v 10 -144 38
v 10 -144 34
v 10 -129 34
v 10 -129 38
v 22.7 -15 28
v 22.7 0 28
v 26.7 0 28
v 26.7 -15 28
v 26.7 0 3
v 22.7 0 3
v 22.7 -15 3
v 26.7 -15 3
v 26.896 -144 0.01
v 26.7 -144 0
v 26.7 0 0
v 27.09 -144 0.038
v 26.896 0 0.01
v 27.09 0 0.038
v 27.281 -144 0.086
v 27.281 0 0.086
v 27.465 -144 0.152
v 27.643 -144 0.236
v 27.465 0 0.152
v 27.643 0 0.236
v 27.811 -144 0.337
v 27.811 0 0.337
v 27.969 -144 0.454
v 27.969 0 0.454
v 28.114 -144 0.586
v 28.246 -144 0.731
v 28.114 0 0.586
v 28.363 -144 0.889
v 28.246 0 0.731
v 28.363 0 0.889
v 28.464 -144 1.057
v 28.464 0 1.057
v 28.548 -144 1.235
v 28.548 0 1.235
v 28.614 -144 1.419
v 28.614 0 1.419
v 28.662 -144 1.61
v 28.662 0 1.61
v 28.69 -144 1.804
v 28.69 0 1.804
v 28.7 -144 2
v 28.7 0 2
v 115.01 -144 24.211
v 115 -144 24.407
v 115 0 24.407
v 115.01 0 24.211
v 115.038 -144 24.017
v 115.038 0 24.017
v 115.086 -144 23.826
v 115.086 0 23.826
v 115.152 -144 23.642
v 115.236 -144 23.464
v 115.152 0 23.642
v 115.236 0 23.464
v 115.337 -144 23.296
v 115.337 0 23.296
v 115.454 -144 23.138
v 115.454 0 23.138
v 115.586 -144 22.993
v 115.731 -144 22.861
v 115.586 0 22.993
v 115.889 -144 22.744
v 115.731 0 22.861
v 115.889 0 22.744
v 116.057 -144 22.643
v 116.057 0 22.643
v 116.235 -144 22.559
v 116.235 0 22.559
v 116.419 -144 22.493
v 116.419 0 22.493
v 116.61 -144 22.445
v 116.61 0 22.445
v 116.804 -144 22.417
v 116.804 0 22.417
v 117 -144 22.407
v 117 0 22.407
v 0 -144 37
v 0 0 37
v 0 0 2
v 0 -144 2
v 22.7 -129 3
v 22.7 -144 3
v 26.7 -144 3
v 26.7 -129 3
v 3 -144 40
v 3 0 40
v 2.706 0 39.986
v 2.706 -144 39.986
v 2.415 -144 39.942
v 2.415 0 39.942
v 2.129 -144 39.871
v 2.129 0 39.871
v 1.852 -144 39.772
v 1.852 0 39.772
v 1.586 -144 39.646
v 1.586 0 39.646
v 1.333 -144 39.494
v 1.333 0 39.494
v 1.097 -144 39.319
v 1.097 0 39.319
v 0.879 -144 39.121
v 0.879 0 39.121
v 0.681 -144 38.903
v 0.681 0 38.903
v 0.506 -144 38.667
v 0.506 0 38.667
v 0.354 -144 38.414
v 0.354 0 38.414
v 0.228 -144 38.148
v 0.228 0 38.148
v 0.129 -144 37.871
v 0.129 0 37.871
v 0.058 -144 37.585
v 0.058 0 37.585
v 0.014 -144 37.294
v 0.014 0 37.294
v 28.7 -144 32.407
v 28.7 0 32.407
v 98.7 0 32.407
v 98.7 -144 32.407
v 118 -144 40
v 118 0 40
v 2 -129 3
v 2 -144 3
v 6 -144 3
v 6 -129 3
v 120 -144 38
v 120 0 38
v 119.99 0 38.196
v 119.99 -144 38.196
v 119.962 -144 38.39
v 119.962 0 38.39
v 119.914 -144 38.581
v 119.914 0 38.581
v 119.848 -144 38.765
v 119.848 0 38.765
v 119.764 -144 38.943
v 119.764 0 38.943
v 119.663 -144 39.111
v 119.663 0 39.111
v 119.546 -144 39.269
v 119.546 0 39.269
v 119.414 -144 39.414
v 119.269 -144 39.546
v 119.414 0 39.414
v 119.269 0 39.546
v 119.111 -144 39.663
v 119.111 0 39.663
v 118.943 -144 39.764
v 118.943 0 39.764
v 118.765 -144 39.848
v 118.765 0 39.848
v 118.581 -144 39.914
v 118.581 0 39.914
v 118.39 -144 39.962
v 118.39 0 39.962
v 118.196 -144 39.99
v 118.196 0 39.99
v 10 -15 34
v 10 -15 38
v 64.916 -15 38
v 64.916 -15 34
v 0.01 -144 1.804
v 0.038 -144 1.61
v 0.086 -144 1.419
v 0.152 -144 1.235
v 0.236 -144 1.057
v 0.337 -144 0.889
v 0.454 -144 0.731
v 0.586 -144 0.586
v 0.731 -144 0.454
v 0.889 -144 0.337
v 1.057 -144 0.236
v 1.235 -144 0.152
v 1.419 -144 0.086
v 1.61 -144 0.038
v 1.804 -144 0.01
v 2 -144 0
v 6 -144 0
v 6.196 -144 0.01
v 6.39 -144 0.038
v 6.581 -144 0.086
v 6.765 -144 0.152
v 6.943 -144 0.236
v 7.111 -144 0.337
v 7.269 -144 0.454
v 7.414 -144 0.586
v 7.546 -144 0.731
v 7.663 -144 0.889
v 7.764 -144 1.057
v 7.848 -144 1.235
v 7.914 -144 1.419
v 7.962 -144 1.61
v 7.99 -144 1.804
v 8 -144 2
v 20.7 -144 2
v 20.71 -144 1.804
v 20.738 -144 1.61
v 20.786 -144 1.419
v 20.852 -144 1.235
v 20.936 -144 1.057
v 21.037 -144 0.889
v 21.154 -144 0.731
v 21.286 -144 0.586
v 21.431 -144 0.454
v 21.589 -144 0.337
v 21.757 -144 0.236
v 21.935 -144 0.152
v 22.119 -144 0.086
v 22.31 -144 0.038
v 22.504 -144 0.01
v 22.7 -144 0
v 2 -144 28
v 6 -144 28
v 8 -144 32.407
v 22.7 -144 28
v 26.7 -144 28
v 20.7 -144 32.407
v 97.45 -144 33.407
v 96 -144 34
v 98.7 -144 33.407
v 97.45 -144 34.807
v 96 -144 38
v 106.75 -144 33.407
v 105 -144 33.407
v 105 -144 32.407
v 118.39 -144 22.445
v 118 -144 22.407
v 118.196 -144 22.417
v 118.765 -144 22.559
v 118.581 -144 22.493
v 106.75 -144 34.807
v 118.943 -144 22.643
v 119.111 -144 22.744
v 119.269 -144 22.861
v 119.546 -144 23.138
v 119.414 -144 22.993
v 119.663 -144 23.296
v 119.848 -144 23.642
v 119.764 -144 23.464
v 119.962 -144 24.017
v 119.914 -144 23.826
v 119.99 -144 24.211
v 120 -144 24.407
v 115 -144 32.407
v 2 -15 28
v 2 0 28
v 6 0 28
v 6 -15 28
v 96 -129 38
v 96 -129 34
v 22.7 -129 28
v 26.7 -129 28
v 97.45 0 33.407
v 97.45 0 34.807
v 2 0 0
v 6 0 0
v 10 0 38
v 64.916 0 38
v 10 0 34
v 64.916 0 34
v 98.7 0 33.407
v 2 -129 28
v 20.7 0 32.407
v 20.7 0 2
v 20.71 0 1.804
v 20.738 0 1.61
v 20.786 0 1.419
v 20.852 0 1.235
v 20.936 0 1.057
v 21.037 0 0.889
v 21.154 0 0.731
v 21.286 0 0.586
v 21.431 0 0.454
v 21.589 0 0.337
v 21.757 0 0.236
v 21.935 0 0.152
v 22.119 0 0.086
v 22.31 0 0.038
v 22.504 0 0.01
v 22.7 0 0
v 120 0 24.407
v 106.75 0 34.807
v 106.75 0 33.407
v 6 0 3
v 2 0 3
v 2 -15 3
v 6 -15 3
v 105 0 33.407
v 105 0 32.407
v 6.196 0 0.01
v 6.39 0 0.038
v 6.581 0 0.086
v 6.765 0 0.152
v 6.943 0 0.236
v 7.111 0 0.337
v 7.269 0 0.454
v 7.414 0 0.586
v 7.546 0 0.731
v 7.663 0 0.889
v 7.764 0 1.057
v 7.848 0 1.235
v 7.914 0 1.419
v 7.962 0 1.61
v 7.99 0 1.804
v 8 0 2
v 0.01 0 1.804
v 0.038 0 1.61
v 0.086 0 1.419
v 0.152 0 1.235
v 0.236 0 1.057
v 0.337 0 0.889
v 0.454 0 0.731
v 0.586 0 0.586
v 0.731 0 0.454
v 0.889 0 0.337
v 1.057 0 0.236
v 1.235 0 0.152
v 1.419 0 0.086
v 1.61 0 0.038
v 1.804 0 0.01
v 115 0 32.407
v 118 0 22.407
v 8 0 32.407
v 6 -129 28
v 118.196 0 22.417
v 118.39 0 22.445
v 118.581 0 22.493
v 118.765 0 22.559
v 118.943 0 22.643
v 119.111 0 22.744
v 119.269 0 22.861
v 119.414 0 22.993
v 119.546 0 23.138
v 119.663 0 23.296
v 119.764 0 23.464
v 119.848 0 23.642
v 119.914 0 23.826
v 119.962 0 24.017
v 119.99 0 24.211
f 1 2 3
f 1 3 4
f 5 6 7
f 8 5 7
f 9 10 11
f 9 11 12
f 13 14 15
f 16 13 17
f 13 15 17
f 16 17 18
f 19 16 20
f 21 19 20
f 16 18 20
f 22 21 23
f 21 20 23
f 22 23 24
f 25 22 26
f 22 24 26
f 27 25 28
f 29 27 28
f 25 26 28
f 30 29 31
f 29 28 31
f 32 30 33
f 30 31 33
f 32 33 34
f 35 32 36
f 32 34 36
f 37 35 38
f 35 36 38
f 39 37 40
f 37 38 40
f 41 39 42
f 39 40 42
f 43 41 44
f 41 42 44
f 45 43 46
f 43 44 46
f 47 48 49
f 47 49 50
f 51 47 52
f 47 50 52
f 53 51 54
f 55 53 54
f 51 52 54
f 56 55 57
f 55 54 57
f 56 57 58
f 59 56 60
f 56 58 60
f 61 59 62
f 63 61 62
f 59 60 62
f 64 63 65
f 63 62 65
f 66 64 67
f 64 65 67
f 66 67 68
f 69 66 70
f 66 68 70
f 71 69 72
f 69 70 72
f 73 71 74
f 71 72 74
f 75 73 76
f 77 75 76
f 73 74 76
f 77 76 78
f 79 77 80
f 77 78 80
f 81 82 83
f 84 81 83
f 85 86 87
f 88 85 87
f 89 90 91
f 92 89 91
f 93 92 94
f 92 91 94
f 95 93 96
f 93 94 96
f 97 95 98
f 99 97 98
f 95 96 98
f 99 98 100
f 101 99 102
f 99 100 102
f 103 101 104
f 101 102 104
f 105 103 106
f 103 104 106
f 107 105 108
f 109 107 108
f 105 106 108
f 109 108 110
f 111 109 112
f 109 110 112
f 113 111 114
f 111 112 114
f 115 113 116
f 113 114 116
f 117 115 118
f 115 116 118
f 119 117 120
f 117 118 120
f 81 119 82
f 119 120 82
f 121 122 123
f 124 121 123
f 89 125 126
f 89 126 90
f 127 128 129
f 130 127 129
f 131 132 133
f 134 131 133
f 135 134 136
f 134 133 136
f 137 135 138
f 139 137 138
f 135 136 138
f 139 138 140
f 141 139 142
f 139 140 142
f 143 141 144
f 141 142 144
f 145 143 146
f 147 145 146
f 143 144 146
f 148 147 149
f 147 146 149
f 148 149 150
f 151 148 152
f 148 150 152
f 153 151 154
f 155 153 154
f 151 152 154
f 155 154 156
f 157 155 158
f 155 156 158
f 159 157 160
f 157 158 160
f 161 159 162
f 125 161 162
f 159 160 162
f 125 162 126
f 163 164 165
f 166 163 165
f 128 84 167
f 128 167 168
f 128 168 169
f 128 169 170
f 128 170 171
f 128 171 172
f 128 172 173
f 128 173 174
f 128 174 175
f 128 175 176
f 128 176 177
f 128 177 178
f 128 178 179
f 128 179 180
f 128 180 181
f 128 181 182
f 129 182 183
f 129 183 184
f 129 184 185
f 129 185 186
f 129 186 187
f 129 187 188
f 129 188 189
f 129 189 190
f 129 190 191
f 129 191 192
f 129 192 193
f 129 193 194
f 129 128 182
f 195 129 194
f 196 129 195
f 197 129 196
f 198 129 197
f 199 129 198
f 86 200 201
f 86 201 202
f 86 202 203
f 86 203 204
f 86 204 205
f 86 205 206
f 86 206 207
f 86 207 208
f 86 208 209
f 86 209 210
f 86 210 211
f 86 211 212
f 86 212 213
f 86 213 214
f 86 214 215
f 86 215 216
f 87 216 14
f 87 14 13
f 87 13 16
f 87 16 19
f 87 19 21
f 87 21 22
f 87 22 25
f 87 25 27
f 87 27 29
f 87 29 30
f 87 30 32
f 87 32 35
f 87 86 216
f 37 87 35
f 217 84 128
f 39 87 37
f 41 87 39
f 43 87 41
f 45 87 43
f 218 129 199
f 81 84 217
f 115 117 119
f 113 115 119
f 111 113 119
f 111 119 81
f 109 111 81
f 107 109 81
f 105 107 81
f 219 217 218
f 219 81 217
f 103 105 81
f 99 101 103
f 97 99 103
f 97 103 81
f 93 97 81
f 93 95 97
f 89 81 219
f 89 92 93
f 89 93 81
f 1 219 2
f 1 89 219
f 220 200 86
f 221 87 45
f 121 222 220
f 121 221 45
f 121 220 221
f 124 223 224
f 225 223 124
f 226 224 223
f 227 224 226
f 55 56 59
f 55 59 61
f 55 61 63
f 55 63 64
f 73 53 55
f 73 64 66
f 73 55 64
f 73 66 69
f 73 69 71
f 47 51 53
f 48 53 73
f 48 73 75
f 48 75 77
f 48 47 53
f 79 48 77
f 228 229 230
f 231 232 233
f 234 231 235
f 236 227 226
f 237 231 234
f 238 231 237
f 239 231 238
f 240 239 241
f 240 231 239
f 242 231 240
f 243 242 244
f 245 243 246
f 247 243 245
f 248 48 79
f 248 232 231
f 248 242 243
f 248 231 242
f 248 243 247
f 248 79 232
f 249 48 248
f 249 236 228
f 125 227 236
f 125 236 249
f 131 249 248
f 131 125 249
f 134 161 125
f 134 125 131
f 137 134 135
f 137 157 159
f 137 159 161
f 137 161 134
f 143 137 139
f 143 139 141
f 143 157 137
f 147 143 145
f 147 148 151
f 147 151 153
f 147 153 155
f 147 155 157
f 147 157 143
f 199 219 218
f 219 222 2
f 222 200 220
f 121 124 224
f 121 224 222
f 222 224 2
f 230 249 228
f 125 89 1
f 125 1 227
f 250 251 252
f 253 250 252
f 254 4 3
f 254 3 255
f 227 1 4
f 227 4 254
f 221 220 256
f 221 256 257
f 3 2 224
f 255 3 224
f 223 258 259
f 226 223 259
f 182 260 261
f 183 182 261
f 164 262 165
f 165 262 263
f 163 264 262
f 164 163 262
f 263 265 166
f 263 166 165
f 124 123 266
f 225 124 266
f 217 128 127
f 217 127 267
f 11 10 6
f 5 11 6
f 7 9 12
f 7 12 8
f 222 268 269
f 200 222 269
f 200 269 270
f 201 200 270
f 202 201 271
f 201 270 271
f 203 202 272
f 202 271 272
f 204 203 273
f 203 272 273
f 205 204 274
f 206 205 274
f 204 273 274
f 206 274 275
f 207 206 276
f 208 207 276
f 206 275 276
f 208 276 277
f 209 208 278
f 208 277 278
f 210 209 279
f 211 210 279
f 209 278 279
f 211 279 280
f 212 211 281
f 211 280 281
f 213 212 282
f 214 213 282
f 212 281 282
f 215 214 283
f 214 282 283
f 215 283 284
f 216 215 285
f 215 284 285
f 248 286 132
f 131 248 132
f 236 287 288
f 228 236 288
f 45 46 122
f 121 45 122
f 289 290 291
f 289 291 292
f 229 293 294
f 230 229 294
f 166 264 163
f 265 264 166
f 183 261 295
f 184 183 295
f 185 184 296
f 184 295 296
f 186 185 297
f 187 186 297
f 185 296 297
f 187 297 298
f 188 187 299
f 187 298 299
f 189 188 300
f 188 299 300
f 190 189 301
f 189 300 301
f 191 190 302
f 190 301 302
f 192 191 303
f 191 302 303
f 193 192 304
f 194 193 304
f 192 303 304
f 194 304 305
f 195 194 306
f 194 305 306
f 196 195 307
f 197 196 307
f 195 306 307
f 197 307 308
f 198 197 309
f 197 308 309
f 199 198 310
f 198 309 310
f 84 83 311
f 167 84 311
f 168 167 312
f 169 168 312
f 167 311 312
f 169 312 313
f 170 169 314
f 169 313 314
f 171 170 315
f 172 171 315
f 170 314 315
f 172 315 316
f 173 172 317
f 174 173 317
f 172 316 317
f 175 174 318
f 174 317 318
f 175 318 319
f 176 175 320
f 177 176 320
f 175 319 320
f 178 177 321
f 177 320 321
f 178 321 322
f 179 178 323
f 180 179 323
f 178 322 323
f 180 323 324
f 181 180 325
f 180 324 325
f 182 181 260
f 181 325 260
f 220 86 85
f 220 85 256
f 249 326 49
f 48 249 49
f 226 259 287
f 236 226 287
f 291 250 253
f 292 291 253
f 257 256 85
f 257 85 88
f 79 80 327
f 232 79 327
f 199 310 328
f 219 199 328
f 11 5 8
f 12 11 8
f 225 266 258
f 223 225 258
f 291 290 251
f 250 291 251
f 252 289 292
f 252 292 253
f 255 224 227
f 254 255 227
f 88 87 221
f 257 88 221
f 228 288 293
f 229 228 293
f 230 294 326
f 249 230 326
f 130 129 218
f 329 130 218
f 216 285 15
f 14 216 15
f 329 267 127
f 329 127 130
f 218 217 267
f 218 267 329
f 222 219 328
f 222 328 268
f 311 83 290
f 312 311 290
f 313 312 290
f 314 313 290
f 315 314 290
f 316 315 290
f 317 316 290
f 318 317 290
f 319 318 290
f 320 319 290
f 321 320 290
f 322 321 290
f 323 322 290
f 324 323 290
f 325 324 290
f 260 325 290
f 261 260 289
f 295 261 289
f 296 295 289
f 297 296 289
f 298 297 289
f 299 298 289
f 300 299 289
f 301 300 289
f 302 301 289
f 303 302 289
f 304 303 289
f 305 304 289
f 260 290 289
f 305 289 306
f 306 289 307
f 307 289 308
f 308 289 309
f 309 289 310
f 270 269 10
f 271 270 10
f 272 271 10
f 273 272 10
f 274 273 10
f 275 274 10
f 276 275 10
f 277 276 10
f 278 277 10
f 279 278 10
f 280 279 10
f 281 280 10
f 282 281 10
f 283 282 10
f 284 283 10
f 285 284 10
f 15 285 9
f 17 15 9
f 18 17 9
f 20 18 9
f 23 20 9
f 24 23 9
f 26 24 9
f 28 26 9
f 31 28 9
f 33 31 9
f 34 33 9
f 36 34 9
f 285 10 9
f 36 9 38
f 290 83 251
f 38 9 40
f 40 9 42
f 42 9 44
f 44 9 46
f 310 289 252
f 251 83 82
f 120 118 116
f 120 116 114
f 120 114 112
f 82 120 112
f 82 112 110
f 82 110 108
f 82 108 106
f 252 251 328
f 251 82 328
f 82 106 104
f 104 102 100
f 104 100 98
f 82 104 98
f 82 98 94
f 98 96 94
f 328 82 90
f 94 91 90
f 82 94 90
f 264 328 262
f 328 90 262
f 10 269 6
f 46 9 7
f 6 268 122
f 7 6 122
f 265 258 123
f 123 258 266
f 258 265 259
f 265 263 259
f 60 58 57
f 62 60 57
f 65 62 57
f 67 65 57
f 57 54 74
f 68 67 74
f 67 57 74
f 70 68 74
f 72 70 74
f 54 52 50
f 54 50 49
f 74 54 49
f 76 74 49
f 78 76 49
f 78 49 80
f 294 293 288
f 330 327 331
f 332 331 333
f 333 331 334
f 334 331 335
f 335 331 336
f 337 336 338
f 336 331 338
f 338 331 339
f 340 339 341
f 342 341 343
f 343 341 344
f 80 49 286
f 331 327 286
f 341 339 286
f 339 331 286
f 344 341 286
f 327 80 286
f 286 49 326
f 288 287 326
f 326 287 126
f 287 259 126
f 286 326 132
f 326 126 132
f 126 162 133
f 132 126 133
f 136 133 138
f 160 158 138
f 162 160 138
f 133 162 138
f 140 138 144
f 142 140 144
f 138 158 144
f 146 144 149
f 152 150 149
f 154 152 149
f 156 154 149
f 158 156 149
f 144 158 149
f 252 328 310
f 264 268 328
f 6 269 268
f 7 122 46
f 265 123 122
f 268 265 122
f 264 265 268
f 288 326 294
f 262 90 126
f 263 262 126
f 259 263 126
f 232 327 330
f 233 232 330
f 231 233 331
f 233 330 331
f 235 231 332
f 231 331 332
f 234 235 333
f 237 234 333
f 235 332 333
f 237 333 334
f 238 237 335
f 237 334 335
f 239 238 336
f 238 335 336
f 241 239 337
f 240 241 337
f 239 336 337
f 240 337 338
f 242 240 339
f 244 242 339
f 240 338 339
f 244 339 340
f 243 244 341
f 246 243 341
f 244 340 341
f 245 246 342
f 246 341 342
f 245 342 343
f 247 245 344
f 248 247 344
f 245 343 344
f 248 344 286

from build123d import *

# Parameters (mm, degrees)
F1_DEPTH = 144
F2_W     = 86
F2_H     = 4
F2_W_2   = 4
F2_H_2   = 25
F3_DEPTH = 15
F4_W     = 54.916096
F4_H     = 4
F4_W_2   = 4
F4_H_2   = 25
F5_DEPTH = 15


with BuildPart() as f1:
    # F0 (on Front) → F1 (new body)
    with BuildSketch(Plane.XZ):
        with BuildLine():
            Line((0, 37), (0, 2))
            ThreePointArc((0, 2), (0.585786, 0.585786), (2, 0))
            Line((2, 0), (6, 0))
            ThreePointArc((6, 0), (7.414214, 0.585786), (8, 2))
            Line((8, 2), (8, 32.406905))
            Line((8, 32.406905), (20.7, 32.406905))
            Line((20.7, 32.406905), (20.7, 2))
            ThreePointArc((20.7, 2), (21.285786, 0.585786), (22.7, 0))
            Line((22.7, 0), (26.7, 0))
            ThreePointArc((26.7, 0), (28.114214, 0.585786), (28.7, 2))
            Line((28.7, 2), (28.7, 32.406905))
            Line((28.7, 32.406905), (98.7, 32.406905))
            Line((98.7, 32.406905), (98.7, 33.406905))
            Line((98.7, 33.406905), (97.45, 33.406905))
            Line((97.45, 33.406905), (97.45, 34.806905))
            Line((97.45, 34.806905), (106.75, 34.806905))
            Line((106.75, 34.806905), (106.75, 33.406905))
            Line((106.75, 33.406905), (105, 33.406905))
            Line((105, 33.406905), (105, 32.406905))
            Line((105, 32.406905), (115, 32.406905))
            Line((115, 32.406905), (120, 32.406905))
            Line((120, 32.406905), (120, 38))
            ThreePointArc((120, 38), (119.414214, 39.414214), (118, 40))
            Line((118, 40), (3, 40))
            ThreePointArc((3, 40), (0.87868, 39.12132), (0, 37))
        make_face()
        with BuildLine():
            Line((120, 24.406905), (120, 32.406905))
            Line((120, 32.406905), (115, 32.406905))
            Line((115, 32.406905), (115, 24.406905))
            ThreePointArc((115, 24.406905), (115.585786, 22.992692), (117, 22.406905))
            Line((117, 22.406905), (118, 22.406905))
            ThreePointArc((118, 22.406905), (119.414214, 22.992692), (120, 24.406905))
        make_face()
    extrude(amount=F1_DEPTH)

    # F2 (on face) → F3 (cut)
    with BuildSketch(Plane.XZ.offset(144)):
        with Locations((53, 36)):
            Rectangle(F2_W, F2_H)
        with Locations((4, 15.5)):
            Rectangle(F2_W_2, F2_H_2)
        with Locations((24.7, 15.5)):
            Rectangle(F2_W_2, F2_H_2)
    extrude(amount=-F3_DEPTH, mode=Mode.SUBTRACT)

    # F4 (on Front) → F5 (cut)
    with BuildSketch(Plane.XZ):
        with Locations((37.458048, 36)):
            Rectangle(F4_W, F4_H)
        with Locations((4, 15.5)):
            Rectangle(F4_W_2, F4_H_2)
        with Locations((24.7, 15.5)):
            Rectangle(F4_W_2, F4_H_2)
    extrude(amount=F5_DEPTH, mode=Mode.SUBTRACT)


solid = f1.part
